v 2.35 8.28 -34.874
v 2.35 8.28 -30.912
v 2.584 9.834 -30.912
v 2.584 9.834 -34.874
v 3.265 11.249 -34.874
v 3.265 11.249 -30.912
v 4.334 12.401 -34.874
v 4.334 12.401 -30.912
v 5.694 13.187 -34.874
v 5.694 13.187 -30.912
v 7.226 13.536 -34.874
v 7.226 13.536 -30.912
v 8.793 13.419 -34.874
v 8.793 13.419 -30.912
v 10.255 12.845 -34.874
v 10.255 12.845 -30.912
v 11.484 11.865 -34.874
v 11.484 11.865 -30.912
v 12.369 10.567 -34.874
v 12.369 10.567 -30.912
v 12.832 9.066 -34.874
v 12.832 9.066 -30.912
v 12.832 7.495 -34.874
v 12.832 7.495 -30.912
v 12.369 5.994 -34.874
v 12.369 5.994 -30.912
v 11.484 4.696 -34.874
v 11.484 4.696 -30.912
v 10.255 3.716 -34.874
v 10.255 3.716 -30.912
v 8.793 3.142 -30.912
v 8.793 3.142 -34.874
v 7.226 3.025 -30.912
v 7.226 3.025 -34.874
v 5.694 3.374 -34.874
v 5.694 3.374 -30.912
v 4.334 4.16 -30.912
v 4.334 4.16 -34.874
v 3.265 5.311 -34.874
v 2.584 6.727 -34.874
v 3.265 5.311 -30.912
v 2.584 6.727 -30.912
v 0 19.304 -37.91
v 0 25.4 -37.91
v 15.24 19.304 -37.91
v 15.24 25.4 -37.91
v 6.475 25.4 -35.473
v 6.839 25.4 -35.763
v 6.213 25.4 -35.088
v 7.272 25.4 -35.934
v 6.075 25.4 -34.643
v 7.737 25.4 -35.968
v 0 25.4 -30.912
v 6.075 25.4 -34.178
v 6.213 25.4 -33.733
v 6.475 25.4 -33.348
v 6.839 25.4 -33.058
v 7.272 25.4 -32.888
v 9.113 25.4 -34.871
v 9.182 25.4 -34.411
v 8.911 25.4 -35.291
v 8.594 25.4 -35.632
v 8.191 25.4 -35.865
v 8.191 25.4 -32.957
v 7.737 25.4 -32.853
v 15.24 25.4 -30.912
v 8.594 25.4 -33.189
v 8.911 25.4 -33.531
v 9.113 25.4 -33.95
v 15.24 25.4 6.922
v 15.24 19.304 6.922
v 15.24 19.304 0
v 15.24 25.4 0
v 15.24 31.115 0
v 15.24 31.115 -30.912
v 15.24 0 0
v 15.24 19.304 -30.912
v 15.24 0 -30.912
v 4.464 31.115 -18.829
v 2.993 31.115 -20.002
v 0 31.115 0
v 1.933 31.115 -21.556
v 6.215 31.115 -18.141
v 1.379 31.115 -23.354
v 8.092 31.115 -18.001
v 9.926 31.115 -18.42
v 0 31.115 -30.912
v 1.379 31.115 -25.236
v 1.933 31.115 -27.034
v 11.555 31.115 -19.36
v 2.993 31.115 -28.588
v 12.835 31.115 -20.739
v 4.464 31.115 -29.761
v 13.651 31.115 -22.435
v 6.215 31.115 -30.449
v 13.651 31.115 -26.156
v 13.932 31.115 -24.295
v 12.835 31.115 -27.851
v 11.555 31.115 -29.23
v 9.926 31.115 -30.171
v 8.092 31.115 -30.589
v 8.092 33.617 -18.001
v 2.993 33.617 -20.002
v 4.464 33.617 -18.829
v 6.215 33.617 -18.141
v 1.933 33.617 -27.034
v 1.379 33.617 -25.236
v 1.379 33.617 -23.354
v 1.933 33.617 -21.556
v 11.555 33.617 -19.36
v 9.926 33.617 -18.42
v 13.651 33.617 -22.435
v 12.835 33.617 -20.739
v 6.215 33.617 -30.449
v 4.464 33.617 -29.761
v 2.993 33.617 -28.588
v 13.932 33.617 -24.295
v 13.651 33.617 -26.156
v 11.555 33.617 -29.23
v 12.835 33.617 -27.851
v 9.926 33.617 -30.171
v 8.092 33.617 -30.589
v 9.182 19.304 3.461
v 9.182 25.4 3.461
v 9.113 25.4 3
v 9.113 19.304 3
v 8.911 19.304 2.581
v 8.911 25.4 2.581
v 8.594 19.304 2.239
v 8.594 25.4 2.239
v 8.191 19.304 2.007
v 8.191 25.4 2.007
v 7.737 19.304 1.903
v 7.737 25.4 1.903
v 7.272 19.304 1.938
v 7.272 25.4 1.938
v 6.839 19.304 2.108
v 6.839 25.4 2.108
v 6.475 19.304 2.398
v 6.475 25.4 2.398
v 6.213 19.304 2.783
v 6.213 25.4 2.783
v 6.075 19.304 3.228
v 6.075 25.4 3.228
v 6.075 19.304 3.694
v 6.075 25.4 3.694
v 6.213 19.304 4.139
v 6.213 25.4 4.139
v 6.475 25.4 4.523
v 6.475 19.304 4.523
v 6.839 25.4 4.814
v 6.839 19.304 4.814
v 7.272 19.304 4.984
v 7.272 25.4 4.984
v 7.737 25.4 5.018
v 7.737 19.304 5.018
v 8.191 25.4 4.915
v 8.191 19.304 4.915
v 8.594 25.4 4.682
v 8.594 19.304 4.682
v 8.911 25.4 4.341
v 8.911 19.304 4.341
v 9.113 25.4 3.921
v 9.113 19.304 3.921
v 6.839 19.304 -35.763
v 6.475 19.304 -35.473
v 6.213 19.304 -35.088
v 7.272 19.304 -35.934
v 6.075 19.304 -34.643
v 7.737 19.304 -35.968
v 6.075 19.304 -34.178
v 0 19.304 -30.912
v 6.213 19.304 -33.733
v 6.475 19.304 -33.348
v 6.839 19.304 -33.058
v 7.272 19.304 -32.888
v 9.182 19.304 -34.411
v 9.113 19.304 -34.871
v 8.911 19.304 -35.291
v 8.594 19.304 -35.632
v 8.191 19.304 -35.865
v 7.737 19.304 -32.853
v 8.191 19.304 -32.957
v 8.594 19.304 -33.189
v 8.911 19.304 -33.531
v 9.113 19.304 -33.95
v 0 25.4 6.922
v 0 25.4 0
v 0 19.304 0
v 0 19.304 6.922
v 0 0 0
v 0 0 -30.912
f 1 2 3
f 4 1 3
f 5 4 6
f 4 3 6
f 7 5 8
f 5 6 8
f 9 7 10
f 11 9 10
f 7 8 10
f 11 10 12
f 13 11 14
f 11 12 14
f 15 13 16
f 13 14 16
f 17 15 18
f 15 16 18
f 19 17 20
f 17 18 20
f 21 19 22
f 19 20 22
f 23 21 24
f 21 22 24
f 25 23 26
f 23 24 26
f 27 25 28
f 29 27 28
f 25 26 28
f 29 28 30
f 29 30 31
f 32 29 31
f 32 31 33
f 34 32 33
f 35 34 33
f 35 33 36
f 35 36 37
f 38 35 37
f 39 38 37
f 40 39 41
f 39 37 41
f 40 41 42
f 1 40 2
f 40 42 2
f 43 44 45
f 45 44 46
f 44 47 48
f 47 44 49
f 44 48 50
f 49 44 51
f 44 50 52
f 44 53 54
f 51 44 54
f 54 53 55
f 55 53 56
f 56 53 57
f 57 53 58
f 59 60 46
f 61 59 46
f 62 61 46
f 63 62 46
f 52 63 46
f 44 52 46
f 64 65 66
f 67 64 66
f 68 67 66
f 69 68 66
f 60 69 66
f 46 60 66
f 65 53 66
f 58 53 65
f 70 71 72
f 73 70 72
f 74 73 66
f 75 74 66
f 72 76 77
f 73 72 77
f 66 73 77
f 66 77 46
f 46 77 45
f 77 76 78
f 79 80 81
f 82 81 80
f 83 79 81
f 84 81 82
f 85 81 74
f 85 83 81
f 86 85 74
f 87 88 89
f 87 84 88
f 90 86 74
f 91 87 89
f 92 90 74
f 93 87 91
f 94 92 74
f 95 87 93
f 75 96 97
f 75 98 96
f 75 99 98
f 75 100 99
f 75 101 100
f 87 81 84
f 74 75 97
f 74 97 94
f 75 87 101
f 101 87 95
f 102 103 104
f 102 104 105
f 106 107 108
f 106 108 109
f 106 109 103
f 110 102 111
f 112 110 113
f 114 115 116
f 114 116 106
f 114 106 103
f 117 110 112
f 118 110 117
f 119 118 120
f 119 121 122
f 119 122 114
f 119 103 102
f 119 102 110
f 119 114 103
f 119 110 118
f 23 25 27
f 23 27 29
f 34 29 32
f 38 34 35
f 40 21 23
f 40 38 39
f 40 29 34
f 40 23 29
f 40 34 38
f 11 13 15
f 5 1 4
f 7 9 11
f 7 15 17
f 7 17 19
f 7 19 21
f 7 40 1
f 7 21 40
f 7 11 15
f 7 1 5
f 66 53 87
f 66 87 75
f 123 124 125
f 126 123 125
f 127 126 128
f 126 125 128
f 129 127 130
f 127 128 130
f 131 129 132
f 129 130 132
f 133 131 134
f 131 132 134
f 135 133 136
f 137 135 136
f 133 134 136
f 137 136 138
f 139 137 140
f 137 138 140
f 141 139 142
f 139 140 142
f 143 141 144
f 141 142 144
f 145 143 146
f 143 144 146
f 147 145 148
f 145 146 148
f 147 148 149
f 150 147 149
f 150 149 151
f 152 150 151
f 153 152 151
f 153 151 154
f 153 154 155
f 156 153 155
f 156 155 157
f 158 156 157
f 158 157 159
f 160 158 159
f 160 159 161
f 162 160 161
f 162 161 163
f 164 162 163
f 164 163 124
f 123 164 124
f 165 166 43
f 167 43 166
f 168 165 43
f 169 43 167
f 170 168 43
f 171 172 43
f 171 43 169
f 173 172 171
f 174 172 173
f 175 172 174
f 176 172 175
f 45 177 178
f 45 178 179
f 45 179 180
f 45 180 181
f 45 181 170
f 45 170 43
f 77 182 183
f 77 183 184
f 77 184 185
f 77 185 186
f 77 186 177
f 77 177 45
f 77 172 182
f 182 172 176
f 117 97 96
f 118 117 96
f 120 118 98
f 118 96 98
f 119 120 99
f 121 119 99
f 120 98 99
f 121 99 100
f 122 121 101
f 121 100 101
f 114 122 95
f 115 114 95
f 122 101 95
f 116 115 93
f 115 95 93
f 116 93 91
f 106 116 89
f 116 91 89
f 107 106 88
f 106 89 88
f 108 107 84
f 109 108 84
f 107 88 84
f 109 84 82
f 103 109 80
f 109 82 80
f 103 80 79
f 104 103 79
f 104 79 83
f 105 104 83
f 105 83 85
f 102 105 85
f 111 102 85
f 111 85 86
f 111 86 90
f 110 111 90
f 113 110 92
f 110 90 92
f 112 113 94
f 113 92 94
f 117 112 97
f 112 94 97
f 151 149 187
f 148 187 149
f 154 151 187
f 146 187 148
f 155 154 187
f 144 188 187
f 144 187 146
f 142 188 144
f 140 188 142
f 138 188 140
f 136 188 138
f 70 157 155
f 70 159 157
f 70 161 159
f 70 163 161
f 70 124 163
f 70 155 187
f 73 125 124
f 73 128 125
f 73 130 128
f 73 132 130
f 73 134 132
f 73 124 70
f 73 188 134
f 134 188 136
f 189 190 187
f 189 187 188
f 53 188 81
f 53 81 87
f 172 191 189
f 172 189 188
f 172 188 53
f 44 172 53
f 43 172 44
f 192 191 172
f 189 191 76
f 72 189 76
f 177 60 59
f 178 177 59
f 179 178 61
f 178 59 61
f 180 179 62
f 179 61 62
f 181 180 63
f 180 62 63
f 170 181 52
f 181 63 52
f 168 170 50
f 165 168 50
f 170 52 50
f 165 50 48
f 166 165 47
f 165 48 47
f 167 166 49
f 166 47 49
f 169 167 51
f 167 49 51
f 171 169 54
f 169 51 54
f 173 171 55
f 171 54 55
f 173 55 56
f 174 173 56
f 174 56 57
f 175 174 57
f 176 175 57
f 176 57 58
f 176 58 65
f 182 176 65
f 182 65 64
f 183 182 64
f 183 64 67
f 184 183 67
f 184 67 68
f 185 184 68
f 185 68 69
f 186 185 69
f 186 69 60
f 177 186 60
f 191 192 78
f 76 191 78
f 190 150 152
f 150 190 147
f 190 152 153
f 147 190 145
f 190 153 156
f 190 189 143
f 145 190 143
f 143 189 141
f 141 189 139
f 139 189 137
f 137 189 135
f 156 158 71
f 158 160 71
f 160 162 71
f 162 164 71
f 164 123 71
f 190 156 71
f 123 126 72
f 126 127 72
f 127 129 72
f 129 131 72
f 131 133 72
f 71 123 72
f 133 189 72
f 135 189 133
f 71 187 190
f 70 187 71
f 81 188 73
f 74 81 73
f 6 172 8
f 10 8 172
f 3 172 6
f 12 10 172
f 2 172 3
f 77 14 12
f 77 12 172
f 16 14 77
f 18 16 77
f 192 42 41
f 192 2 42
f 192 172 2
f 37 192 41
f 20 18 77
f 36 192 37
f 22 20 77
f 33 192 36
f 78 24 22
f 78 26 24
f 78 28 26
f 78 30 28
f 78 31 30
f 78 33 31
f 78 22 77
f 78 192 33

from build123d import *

# Parameters (mm, degrees)
SKETCH1_W                = 15.24
SKETCH1_H                = 30.9118
BOSS_EXTRUDE1_DEPTH      = 31.115
SKETCH2_W                = 15.24
SKETCH2_H                = 6.096
BOSS_EXTRUDE2_DEPTH      = 6.9215
BOSS_EXTRUDE2_DEPTH_BACK = 37.9095
SKETCH3_R                = 5.2705
BOSS_EXTRUDE3_DEPTH      = 3.9624
SKETCH4_R                = 6.3119
BOSS_EXTRUDE4_DEPTH      = 2.5019
CUT_EXTRUDE1_REACH       = 27.4
SKETCH8_R                = 1.5621
CUT_EXTRUDE2_REACH       = 27.4
SKETCH9_R                = 1.5621


with BuildPart() as part:
    # Sketch1 → Boss-Extrude1 (new body)
    with BuildSketch(Plane(origin=(0, 0, 0), x_dir=(1, 0, 0), z_dir=(0, 1, 0))):
        with Locations((7.62, 15.4559)):
            Rectangle(SKETCH1_W, SKETCH1_H)
    extrude(amount=BOSS_EXTRUDE1_DEPTH)

    # Sketch2 → Boss-Extrude2 (add, two sides)
    with BuildSketch(Plane.XY) as boss_extrude2_sk:
        with Locations((7.62, 22.352)):
            Rectangle(SKETCH2_W, SKETCH2_H)
    extrude(amount=BOSS_EXTRUDE2_DEPTH)
    extrude(boss_extrude2_sk.sketch, amount=-BOSS_EXTRUDE2_DEPTH_BACK)

    # Sketch3 → Boss-Extrude3 (add)
    with BuildSketch(Plane(origin=(0, 0, -30.9118), x_dir=(-1, 0, 0), z_dir=(0, 0, -1))):
        with Locations((-7.62, 8.2804)):
            Circle(SKETCH3_R)
    extrude(amount=BOSS_EXTRUDE3_DEPTH)

    # Sketch4 → Boss-Extrude4 (add)
    with BuildSketch(Plane(origin=(0, 31.115, 0), x_dir=(1, 0, 0), z_dir=(0, 1, 0))):
        with Locations((7.62, 24.2951)):
            Circle(SKETCH4_R)
    extrude(amount=BOSS_EXTRUDE4_DEPTH)

    # Sketch8 → Cut-Extrude1 (cut, up to next)
    with BuildSketch(Plane(origin=(0, 25.4, 0), x_dir=(1, 0, 0), z_dir=(0, 1, 0)), mode=Mode.PRIVATE) as cut_extrude1_sk1:
        with Locations((7.62, -3.46075)):
            Circle(SKETCH8_R)
    cut_extrude1_tool1 = extrude(cut_extrude1_sk1.sketch, amount=-CUT_EXTRUDE1_REACH, mode=Mode.PRIVATE) & part.part
    add(cut_extrude1_tool1.solids().sort_by_distance((7.62, 25.4, 3.46075))[0], mode=Mode.SUBTRACT)

    # Sketch9 → Cut-Extrude2 (cut, up to next)
    with BuildSketch(Plane(origin=(0, 25.4, 0), x_dir=(1, 0, 0), z_dir=(0, 1, 0)), mode=Mode.PRIVATE) as cut_extrude2_sk1:
        with Locations((7.62, 34.41065)):
            Circle(SKETCH9_R)
    cut_extrude2_tool1 = extrude(cut_extrude2_sk1.sketch, amount=-CUT_EXTRUDE2_REACH, mode=Mode.PRIVATE) & part.part
    add(cut_extrude2_tool1.solids().sort_by_distance((7.62, 25.4, -34.41065))[0], mode=Mode.SUBTRACT)


solid = part.part
